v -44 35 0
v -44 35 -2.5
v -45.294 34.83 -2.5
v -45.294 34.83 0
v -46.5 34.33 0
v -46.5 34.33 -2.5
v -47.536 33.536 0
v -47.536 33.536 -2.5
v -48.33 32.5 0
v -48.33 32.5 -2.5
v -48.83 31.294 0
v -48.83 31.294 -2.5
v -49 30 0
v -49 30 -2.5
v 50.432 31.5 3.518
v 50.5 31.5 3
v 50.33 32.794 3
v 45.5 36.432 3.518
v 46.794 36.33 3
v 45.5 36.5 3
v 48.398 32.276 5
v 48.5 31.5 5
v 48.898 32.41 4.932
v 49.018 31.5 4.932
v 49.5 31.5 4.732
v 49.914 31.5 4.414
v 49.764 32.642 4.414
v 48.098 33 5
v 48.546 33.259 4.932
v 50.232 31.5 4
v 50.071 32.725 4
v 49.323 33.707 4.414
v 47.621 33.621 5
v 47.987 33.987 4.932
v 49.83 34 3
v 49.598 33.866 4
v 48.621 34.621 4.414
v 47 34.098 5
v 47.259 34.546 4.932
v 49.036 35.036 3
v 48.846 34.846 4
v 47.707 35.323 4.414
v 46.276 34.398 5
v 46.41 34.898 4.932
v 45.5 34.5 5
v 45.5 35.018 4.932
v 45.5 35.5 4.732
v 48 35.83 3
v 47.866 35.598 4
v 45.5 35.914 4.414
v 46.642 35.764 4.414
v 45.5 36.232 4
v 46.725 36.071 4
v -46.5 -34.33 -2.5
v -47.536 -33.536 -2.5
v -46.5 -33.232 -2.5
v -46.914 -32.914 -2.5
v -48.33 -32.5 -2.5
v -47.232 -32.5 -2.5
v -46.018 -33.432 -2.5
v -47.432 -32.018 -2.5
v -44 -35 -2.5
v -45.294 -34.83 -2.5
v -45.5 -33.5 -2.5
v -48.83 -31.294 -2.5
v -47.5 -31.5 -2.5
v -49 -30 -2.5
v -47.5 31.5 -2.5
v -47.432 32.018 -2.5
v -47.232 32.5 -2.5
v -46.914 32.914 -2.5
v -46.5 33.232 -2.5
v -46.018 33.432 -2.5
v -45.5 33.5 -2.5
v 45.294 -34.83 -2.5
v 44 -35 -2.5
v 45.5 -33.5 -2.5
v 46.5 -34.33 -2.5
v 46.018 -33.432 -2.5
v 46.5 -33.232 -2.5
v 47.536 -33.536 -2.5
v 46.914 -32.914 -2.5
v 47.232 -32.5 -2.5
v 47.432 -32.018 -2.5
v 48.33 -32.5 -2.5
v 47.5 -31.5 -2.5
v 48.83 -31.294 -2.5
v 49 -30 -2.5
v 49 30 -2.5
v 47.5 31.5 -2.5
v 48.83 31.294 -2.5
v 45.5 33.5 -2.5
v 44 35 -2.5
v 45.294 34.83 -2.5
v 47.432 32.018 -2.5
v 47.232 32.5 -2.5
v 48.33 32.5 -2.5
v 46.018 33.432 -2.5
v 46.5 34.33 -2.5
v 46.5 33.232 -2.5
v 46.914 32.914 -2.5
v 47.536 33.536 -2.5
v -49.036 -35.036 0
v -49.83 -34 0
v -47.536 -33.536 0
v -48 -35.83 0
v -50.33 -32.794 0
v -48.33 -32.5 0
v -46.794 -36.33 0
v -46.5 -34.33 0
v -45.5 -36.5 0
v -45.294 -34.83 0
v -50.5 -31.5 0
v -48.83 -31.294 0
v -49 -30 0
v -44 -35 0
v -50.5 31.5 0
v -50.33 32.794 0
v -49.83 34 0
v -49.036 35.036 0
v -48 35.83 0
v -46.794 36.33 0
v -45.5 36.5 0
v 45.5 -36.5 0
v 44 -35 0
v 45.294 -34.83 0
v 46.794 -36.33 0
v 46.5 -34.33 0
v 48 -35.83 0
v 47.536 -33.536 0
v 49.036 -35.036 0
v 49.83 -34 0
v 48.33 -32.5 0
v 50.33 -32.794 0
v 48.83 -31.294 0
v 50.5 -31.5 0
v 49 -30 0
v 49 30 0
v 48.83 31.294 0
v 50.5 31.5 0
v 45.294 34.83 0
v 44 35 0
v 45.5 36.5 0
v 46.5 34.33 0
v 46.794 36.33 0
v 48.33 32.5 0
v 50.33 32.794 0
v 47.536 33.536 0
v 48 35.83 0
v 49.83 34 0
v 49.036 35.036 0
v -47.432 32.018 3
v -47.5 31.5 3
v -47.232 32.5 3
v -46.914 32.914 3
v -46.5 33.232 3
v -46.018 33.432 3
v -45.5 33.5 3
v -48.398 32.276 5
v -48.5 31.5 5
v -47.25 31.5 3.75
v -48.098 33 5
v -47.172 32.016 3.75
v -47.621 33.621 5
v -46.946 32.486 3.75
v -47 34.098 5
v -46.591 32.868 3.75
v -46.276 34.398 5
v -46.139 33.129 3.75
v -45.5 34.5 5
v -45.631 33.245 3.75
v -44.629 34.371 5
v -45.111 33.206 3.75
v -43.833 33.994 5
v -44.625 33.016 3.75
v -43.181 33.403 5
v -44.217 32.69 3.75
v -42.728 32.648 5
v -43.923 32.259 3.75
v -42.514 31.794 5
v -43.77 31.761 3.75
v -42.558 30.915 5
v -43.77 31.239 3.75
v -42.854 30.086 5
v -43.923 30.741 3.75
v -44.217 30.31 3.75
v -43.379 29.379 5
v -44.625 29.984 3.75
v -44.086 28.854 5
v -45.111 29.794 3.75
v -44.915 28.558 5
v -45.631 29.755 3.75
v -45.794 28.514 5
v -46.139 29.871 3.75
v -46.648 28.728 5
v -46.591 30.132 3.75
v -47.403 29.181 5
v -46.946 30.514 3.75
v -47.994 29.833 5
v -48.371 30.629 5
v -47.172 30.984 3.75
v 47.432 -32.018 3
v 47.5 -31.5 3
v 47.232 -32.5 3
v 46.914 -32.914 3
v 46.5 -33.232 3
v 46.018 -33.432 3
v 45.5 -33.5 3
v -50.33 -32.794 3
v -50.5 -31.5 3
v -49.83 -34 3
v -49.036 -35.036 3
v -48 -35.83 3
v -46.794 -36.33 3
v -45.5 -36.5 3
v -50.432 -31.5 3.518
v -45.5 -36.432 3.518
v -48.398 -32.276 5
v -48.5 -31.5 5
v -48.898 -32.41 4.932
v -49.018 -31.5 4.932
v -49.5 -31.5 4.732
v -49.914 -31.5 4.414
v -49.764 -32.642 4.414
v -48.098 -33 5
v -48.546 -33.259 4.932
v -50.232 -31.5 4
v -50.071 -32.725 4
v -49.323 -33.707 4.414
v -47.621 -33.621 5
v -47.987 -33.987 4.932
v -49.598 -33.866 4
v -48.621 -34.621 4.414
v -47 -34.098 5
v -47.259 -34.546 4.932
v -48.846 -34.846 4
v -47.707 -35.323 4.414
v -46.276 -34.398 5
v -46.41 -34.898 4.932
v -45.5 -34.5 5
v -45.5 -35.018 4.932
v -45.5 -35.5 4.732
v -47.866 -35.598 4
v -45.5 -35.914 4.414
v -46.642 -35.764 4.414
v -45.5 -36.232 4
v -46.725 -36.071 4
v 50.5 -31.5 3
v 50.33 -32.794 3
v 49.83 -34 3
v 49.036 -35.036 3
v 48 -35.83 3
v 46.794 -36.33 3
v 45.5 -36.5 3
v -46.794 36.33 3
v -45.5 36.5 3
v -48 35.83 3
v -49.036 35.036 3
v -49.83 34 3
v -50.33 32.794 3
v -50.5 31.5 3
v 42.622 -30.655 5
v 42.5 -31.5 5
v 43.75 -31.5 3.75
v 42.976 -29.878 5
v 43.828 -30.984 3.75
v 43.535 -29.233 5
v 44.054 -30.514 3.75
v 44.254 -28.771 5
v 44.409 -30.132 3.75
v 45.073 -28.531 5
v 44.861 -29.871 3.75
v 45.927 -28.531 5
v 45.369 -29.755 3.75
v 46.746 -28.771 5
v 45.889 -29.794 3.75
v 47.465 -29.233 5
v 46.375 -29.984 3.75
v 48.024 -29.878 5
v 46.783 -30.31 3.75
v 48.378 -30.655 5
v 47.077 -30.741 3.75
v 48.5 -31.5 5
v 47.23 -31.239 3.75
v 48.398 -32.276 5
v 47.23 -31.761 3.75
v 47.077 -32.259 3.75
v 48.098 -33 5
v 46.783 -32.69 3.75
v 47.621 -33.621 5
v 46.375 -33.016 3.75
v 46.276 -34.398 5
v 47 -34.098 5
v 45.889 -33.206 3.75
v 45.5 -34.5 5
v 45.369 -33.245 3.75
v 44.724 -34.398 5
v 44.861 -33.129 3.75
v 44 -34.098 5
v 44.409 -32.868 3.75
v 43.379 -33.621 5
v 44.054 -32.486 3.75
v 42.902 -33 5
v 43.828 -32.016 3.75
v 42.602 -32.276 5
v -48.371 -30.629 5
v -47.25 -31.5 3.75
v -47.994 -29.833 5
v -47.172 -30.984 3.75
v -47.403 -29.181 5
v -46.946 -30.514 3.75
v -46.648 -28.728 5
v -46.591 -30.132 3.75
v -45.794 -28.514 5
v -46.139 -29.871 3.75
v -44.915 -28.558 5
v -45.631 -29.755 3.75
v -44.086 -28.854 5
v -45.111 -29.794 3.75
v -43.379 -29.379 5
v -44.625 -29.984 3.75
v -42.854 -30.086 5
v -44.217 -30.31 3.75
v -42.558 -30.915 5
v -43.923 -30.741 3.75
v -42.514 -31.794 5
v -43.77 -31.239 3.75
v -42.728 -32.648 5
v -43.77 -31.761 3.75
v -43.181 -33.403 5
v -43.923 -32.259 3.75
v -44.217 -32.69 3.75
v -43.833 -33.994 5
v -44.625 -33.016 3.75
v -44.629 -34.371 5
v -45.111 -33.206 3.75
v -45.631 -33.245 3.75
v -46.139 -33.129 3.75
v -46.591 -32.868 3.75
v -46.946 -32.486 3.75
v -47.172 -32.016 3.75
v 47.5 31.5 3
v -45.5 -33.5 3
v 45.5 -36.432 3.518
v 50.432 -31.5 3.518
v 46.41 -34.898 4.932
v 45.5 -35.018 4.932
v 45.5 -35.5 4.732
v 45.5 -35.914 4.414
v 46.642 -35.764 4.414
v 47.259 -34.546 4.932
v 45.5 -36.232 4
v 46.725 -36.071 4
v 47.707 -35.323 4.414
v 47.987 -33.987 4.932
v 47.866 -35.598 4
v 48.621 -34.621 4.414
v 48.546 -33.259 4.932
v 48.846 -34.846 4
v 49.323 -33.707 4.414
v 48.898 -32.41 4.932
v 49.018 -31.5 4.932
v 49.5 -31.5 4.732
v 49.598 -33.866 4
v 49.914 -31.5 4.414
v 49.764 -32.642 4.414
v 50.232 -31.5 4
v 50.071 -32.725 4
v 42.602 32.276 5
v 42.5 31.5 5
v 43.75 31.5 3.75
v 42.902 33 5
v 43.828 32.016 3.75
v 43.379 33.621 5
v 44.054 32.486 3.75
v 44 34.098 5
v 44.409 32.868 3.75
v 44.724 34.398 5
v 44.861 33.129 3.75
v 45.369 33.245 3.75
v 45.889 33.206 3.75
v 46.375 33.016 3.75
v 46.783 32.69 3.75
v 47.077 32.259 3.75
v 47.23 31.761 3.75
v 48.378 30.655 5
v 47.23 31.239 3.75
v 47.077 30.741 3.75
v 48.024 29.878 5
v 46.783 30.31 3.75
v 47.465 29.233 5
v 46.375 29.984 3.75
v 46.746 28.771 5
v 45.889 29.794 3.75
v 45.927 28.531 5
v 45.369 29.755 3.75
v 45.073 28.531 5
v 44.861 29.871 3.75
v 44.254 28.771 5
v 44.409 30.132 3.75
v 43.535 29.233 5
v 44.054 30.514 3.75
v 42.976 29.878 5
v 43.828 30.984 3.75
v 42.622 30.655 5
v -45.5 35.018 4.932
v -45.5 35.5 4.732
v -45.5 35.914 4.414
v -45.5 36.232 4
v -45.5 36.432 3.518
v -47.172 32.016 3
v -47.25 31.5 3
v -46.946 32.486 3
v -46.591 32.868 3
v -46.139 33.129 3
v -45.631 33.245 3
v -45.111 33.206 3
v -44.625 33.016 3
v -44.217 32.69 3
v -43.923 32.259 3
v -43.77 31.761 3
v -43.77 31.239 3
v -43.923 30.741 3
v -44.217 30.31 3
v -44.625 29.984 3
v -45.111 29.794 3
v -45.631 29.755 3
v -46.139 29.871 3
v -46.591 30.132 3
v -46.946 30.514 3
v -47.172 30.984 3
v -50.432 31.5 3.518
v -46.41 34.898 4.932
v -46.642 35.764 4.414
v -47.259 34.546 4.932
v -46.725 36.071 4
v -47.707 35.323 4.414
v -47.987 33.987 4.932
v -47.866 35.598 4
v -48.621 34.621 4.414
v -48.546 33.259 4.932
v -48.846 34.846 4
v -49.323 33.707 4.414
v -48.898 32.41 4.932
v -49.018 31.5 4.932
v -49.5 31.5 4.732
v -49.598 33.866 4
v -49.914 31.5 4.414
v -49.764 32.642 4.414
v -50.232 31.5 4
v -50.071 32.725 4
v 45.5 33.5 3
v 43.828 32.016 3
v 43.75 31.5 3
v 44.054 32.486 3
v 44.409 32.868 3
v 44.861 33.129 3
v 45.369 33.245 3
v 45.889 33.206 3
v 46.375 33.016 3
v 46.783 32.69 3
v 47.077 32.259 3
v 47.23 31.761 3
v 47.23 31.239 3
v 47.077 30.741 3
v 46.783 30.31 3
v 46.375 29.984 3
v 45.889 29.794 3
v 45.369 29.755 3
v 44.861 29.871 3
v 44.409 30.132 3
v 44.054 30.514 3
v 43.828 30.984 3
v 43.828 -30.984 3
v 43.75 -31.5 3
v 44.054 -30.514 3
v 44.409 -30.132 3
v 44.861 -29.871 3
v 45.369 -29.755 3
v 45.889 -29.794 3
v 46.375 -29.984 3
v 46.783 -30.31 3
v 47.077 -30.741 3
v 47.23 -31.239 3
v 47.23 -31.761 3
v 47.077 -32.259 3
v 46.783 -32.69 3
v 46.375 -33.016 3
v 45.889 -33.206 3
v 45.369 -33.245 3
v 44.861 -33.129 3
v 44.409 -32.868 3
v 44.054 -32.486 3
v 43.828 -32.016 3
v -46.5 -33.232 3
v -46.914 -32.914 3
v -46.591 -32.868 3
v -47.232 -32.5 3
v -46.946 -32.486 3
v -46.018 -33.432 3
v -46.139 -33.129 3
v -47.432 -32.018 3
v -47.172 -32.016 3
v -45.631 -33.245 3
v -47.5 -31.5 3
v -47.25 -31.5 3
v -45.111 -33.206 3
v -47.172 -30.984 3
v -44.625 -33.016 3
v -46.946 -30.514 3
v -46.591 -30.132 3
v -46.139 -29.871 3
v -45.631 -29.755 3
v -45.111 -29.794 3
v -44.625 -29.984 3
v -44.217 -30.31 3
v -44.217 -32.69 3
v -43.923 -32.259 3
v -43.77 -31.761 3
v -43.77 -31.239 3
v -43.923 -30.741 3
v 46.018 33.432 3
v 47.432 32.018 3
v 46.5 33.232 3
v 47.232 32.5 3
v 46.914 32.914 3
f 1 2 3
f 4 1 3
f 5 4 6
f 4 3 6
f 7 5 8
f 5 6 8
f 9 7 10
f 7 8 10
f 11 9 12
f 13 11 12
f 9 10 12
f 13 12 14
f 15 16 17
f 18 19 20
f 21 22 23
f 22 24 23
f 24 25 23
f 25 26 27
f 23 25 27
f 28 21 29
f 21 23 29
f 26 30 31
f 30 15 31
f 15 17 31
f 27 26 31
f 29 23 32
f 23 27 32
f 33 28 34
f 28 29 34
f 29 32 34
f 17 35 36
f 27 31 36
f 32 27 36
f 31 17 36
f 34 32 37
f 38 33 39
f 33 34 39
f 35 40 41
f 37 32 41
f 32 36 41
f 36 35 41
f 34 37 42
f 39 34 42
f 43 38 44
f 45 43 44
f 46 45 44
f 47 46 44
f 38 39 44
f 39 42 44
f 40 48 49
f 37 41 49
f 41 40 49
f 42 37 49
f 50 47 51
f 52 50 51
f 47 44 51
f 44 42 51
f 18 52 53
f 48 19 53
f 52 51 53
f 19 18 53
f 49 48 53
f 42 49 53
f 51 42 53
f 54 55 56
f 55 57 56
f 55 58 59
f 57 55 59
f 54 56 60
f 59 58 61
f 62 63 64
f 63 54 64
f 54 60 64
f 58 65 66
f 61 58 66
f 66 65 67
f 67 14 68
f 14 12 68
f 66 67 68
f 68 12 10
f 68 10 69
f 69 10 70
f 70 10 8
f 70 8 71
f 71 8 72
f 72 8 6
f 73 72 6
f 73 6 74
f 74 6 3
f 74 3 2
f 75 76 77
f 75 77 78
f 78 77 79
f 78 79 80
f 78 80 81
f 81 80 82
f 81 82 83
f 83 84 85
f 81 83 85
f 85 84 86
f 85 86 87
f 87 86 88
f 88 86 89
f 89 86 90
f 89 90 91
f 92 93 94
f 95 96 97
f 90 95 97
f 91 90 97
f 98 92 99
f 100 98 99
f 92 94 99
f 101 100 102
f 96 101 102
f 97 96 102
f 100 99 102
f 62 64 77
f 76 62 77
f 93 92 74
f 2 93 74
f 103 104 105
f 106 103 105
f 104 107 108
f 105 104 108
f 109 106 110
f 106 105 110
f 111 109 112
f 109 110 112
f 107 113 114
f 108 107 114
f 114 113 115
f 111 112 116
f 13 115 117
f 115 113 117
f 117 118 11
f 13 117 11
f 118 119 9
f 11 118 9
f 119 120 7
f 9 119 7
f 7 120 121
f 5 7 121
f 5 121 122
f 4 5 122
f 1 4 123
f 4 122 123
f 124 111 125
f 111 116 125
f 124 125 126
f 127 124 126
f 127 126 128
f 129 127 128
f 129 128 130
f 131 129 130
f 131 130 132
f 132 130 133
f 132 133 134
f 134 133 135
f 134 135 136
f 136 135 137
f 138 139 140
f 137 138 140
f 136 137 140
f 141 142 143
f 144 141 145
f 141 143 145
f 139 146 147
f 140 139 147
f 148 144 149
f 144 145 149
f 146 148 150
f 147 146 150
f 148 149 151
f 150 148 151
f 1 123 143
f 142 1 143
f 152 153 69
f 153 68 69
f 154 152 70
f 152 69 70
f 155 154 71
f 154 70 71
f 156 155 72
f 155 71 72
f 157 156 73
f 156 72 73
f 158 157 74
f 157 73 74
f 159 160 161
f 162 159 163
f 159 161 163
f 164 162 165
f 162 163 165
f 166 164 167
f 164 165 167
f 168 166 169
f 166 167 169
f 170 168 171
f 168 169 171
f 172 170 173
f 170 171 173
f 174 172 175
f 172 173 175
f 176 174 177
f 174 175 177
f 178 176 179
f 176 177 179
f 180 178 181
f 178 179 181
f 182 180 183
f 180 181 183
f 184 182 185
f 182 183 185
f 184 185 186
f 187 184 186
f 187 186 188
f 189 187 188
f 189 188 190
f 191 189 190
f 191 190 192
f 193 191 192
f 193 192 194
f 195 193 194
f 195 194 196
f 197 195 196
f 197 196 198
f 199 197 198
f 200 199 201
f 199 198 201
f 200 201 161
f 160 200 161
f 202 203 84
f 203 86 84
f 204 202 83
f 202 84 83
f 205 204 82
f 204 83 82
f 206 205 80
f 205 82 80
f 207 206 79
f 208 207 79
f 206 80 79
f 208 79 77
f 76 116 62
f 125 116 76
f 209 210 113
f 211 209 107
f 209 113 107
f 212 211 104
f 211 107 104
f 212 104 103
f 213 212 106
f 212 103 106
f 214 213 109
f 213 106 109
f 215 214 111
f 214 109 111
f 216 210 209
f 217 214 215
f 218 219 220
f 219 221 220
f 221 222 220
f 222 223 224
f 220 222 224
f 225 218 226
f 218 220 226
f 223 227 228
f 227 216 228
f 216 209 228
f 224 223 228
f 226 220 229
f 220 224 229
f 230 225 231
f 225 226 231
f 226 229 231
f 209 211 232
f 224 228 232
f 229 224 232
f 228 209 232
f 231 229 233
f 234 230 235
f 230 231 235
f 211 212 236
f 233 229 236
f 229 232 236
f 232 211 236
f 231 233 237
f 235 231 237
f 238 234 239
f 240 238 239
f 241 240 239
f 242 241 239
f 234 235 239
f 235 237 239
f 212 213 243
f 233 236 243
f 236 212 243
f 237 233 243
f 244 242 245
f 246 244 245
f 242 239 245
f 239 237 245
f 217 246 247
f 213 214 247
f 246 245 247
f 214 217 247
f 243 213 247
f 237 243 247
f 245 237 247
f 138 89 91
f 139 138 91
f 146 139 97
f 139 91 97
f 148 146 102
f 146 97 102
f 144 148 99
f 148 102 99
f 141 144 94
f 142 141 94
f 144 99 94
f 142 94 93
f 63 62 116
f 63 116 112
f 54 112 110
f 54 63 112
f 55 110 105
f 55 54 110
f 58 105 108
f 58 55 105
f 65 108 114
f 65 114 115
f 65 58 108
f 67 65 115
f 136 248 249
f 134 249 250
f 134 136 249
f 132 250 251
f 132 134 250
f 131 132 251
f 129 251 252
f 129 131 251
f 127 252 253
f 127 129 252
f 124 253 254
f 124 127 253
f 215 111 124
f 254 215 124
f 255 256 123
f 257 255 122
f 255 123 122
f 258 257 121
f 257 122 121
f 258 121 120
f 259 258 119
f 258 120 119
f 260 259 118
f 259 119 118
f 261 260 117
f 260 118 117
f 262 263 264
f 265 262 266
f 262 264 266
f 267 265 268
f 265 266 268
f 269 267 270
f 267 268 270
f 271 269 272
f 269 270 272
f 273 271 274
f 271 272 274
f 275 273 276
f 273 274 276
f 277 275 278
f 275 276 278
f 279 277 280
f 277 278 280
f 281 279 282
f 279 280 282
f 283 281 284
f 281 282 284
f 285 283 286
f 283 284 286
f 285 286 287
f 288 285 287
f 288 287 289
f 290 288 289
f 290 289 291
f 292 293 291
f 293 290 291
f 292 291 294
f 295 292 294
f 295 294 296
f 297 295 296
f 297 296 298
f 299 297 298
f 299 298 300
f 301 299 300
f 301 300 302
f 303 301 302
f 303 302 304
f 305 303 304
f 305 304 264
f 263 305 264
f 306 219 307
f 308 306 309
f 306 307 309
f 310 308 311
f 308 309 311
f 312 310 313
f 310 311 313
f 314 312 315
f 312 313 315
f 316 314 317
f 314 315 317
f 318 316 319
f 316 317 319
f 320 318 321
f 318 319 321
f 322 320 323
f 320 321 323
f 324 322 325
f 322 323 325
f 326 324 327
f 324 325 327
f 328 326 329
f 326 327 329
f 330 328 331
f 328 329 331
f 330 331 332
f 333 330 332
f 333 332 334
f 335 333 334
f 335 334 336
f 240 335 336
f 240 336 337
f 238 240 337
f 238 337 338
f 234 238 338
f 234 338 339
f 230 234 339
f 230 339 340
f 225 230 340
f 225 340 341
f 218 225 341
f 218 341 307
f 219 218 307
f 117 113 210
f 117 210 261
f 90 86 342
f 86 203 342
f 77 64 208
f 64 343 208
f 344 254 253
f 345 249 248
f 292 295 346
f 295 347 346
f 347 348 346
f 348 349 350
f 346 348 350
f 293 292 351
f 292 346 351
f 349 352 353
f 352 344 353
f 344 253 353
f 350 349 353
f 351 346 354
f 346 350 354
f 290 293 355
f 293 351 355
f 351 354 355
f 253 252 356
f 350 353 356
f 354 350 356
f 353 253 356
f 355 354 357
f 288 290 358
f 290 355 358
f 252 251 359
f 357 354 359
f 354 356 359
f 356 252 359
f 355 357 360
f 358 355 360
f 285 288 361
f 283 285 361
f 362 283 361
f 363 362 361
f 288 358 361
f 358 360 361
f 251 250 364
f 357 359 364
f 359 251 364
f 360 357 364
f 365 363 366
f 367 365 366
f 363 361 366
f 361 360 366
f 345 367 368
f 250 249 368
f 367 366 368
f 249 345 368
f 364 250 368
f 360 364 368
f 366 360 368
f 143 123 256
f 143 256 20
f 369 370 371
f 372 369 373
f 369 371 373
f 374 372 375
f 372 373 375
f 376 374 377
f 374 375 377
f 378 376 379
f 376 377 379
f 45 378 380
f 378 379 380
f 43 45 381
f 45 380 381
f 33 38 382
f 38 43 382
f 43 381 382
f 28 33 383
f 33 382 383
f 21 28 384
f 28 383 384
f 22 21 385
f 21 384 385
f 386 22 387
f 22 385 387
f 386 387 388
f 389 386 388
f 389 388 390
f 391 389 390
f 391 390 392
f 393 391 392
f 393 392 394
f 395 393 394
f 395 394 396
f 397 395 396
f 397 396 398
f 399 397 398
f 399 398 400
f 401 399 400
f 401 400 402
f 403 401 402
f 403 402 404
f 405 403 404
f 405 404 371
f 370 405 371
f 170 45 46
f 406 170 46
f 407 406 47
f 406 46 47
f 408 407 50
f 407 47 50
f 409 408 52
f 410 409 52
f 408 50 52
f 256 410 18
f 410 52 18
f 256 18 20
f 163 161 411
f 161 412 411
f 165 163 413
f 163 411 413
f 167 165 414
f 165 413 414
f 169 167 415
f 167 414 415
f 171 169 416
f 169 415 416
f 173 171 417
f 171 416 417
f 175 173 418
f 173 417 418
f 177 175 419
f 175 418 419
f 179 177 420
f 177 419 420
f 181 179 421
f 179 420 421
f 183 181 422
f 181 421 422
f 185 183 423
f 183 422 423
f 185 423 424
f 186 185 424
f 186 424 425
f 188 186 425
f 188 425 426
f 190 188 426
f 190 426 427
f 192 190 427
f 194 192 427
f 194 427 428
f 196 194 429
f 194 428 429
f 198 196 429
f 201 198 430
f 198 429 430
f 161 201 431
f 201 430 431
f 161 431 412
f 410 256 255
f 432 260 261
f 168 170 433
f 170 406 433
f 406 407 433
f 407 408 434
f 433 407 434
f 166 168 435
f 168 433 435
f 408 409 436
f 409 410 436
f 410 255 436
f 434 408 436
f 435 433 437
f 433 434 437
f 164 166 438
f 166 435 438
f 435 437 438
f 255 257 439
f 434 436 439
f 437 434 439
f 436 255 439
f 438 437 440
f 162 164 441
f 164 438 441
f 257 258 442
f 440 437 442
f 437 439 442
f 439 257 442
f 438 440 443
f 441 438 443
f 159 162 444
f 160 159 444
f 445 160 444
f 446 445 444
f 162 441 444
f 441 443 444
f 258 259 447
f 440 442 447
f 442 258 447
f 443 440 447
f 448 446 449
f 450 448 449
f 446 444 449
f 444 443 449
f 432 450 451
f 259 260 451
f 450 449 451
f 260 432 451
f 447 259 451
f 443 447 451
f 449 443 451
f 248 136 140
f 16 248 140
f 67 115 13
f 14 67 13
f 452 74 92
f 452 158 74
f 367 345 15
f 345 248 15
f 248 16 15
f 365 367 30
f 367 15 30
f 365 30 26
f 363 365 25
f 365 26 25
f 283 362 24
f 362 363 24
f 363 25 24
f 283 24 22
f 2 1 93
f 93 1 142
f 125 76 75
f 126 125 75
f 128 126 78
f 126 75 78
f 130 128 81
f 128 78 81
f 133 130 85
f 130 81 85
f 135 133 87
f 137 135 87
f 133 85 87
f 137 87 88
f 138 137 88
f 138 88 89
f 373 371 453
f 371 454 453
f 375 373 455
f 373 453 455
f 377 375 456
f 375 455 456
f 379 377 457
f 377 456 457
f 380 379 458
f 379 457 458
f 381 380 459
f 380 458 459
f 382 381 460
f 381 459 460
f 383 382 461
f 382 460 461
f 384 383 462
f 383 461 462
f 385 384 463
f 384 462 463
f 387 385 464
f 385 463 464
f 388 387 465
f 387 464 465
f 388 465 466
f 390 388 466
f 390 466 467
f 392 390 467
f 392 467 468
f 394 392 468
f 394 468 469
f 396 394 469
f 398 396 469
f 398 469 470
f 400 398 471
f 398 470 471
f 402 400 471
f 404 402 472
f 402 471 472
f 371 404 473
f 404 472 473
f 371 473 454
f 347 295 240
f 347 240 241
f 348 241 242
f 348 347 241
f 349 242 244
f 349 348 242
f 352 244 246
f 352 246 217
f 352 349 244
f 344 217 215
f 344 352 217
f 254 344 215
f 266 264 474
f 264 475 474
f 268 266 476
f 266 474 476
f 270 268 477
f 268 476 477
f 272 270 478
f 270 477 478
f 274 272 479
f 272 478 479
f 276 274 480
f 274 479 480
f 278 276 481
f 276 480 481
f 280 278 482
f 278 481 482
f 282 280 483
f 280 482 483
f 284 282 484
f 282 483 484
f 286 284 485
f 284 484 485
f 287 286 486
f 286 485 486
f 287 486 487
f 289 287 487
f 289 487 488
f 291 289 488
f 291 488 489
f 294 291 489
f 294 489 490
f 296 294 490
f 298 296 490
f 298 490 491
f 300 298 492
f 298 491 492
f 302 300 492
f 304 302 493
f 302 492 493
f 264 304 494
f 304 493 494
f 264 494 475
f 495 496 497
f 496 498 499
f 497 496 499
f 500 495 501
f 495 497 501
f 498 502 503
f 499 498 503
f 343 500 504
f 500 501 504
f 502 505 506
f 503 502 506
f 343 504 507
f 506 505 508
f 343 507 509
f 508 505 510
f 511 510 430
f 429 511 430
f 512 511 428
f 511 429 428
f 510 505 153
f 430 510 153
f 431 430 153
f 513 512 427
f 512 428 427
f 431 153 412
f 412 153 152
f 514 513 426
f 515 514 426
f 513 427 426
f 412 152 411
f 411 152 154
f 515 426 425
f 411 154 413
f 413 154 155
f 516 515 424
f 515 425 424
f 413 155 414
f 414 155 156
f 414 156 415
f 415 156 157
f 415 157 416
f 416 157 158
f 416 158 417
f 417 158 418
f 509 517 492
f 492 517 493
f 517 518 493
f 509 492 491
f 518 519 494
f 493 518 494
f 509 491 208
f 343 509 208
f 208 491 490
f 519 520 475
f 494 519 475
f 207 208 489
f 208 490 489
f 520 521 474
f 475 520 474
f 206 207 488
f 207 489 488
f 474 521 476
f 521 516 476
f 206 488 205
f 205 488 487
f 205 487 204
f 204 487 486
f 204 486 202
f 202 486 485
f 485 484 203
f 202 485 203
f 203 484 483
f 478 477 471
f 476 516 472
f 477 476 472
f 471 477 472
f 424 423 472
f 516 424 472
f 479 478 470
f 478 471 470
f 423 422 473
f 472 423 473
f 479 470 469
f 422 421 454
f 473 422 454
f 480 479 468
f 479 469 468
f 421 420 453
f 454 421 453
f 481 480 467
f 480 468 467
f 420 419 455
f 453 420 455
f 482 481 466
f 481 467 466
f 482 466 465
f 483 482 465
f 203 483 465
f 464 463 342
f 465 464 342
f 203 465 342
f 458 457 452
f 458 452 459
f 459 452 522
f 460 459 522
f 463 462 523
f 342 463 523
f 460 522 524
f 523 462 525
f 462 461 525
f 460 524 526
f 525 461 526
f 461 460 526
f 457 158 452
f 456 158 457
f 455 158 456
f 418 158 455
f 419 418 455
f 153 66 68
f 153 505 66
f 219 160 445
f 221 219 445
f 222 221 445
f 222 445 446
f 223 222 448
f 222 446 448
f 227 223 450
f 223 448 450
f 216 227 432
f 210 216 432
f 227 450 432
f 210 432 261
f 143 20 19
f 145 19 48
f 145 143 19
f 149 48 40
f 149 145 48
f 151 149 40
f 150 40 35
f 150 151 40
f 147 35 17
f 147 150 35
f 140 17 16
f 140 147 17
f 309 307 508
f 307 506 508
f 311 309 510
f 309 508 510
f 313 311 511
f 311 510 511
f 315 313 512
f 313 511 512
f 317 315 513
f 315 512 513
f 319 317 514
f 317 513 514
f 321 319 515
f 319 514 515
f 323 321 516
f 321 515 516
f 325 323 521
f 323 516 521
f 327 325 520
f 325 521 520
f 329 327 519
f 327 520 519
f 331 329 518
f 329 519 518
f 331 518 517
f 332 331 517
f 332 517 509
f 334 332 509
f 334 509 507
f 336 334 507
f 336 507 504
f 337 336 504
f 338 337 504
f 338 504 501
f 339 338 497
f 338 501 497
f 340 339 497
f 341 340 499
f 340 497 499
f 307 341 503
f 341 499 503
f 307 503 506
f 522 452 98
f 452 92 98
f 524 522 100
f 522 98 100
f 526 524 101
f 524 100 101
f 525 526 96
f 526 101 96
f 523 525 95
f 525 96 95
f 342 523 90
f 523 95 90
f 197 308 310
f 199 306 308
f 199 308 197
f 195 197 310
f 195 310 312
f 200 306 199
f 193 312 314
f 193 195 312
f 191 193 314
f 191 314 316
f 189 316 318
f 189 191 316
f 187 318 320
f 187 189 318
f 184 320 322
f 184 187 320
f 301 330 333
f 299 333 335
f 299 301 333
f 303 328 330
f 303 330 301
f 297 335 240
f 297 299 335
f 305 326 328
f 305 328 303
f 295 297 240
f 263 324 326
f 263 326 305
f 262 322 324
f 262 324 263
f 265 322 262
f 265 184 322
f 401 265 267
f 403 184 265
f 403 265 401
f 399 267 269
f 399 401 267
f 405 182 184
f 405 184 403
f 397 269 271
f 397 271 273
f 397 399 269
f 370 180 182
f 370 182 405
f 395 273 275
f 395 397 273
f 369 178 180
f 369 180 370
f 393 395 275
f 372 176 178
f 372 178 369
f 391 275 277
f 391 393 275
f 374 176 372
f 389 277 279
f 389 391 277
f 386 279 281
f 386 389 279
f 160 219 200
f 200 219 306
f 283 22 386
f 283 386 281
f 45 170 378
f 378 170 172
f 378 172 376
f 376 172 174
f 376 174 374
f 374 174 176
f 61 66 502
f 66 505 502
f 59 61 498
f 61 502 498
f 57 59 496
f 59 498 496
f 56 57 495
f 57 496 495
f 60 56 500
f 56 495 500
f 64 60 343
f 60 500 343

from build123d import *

# Parameters (mm, degrees)
F0_W           = 101
F0_H           = 73
F0_W_2         = 98
F0_H_2         = 70
F0_W_3         = 95
F0_H_3         = 67
F1_DEPTH       = 5
F2_DEPTH       = 3
F3_DEPTH       = 2.5
F4_R           = 2
F5_T1_DEPTH    = 2.5
F5_T3_DEPTH    = 5
F5_T6_ANGLE    = 90
F5_T8_ANGLE    = 90
F5_T10_ANGLE   = 90
F5_T12_ANGLE   = 90
F7_D           = 3.5
F7_DEPTH       = 6
F7_CSINK_D     = 6
F7_CSINK_ANGLE = 90
F7_TIP         = 1.0515060833


# Not quite as in the source:
# - a fillet or chamfer that OpenCascade refuses, or shapes differently, is made with other operations: its cross-section is extruded or revolved along the edge and cut away or added
# - a feature names something its author has since deleted; it is built from what else it names


with BuildPart() as f1:
    # F0 (on Top) → F1 (new body)
    with BuildSketch(Plane.XY):
        Rectangle(F0_W, F0_H)
        Rectangle(F0_W_2, F0_H_2, mode=Mode.SUBTRACT)
        Rectangle(F0_W_2, F0_H_2)
        Rectangle(F0_W_3, F0_H_3, mode=Mode.SUBTRACT)
        Rectangle(F0_W_3, F0_H_3)
    extrude(amount=F1_DEPTH)

    # F0 (on Top) → F2 (cut)
    with BuildSketch(Plane.XY):
        Rectangle(F0_W_3, F0_H_3)
    extrude(amount=F2_DEPTH, mode=Mode.SUBTRACT)

    # F0 (on Top) → F3 (join)
    with BuildSketch(Plane.XY):
        Rectangle(F0_W_2, F0_H_2)
        Rectangle(F0_W_3, F0_H_3, mode=Mode.SUBTRACT)
    extrude(amount=-F3_DEPTH)

    # F4
    f4_edges = [f1.edges().sort_by_distance(p)[0] for p in [
        (-47.5, -33.5, 0.25),
        (-47.5, 33.5, 0.25),
        (47.5, 33.5, 0.25),
        (47.5, -33.5, 0.25),
        (0, -36.5, 5),
        (50.5, 0, 5),
        (-50.5, 0, 5),
        (0, 36.5, 5),
    ]]
    fillet(f4_edges, radius=F4_R)

    # F5: fillet of radius 5 on 8 edges, made by hand

    # F5_s2 → F5_t1 (cut)
    with BuildSketch(Plane.XY.offset(-2.5)):
        with BuildLine():
            ThreePointArc((-44, -35), (-47.5355339059, -33.5355339059), (-49, -30))
            Line((-49, -30), (-49.1, -30))
            Line((-49.1, -30), (-49.1, -35.1))
            Line((-49.1, -35.1), (-44, -35.1))
            Line((-44, -35.1), (-44, -35))
        make_face()
        with BuildLine():
            ThreePointArc((44, -35), (47.5355339059, -33.5355339059), (49, -30))
            Line((49, -30), (49.1, -30))
            Line((49.1, -30), (49.1, -35.1))
            Line((49.1, -35.1), (44, -35.1))
            Line((44, -35.1), (44, -35))
        make_face()
        with BuildLine():
            ThreePointArc((49, 30), (47.5355339059, 33.5355339059), (44, 35))
            Line((44, 35), (44, 35.1))
            Line((44, 35.1), (49.1, 35.1))
            Line((49.1, 35.1), (49.1, 30))
            Line((49.1, 30), (49, 30))
        make_face()
        with BuildLine():
            ThreePointArc((-44, 35), (-47.5355339059, 33.5355339059), (-49, 30))
            Line((-49, 30), (-49.1, 30))
            Line((-49.1, 30), (-49.1, 35.1))
            Line((-49.1, 35.1), (-44, 35.1))
            Line((-44, 35.1), (-44, 35))
        make_face()
    extrude(amount=F5_T1_DEPTH, mode=Mode.SUBTRACT)

    # F5_s4 → F5_t3 (cut)
    with BuildSketch(Plane.XY):
        with BuildLine():
            ThreePointArc((-50.5, -31.5), (-49.0355339059, -35.0355339059), (-45.5, -36.5))
            Line((-45.5, -36.5), (-45.5, -36.6))
            Line((-45.5, -36.6), (-50.6, -36.6))
            Line((-50.6, -36.6), (-50.6, -31.5))
            Line((-50.6, -31.5), (-50.5, -31.5))
        make_face()
        with BuildLine():
            ThreePointArc((50.5, -31.5), (49.0355339059, -35.0355339059), (45.5, -36.5))
            Line((45.5, -36.5), (45.5, -36.6))
            Line((45.5, -36.6), (50.6, -36.6))
            Line((50.6, -36.6), (50.6, -31.5))
            Line((50.6, -31.5), (50.5, -31.5))
        make_face()
        with BuildLine():
            ThreePointArc((45.5, 36.5), (49.0355339059, 35.0355339059), (50.5, 31.5))
            Line((50.5, 31.5), (50.6, 31.5))
            Line((50.6, 31.5), (50.6, 36.6))
            Line((50.6, 36.6), (45.5, 36.6))
            Line((45.5, 36.6), (45.5, 36.5))
        make_face()
        with BuildLine():
            ThreePointArc((-45.5, 36.5), (-49.0355339059, 35.0355339059), (-50.5, 31.5))
            Line((-50.5, 31.5), (-50.6, 31.5))
            Line((-50.6, 31.5), (-50.6, 36.6))
            Line((-50.6, 36.6), (-45.5, 36.6))
            Line((-45.5, 36.6), (-45.5, 36.5))
        make_face()
    extrude(amount=F5_T3_DEPTH, mode=Mode.SUBTRACT)

    # F5_s5 → F5_t6 (revolve, cut)
    with BuildSketch(Plane.YZ.offset(-45.5)):
        with BuildLine():
            ThreePointArc((34.5, 5), (35.9142135624, 4.4142135624), (36.5, 3))
            Line((36.5, 3), (36.5, 5))
            Line((36.5, 5), (34.5, 5))
        make_face()
    revolve(axis=Axis((-45.5, 31.5, 5), (0, 0, 1)), revolution_arc=F5_T6_ANGLE, mode=Mode.SUBTRACT)

    # F5_s7 → F5_t8 (revolve, cut)
    with BuildSketch(Plane.XZ.offset(-31.5)):
        with BuildLine():
            ThreePointArc((48.5, 5), (49.9142135624, 4.4142135624), (50.5, 3))
            Line((50.5, 3), (50.5, 5))
            Line((50.5, 5), (48.5, 5))
        make_face()
    revolve(axis=Axis((45.5, 31.5, 5), (0, 0, 1)), revolution_arc=F5_T8_ANGLE, mode=Mode.SUBTRACT)

    # F5_s9 → F5_t10 (revolve, cut)
    with BuildSketch(Plane.YZ.offset(45.5)):
        with BuildLine():
            ThreePointArc((-34.5, 5), (-35.9142135624, 4.4142135624), (-36.5, 3))
            Line((-36.5, 3), (-36.5, 5))
            Line((-36.5, 5), (-34.5, 5))
        make_face()
    revolve(axis=Axis((45.5, -31.5, 5), (0, 0, 1)), revolution_arc=F5_T10_ANGLE, mode=Mode.SUBTRACT)

    # F5_s11 → F5_t12 (revolve, cut)
    with BuildSketch(Plane.XZ.offset(31.5)):
        with BuildLine():
            ThreePointArc((-48.5, 5), (-49.9142135624, 4.4142135624), (-50.5, 3))
            Line((-50.5, 3), (-50.5, 5))
            Line((-50.5, 5), (-48.5, 5))
        make_face()
    revolve(axis=Axis((-45.5, -31.5, 5), (0, 0, 1)), revolution_arc=F5_T12_ANGLE, mode=Mode.SUBTRACT)

    # F7
    with Locations(Plane.XY.offset(5)):
        with Locations((45.5, -31.5), (-45.5, -31.5), (-45.5, 31.5), (45.5, 31.5)):
            CounterSinkHole(F7_D / 2, F7_CSINK_D / 2, depth=F7_DEPTH, counter_sink_angle=F7_CSINK_ANGLE)
            with Locations((0, 0, -(F7_DEPTH + F7_TIP / 2))):  # 118° drill point
                Cone(0, F7_D / 2, F7_TIP, mode=Mode.SUBTRACT)


solid = f1.part
